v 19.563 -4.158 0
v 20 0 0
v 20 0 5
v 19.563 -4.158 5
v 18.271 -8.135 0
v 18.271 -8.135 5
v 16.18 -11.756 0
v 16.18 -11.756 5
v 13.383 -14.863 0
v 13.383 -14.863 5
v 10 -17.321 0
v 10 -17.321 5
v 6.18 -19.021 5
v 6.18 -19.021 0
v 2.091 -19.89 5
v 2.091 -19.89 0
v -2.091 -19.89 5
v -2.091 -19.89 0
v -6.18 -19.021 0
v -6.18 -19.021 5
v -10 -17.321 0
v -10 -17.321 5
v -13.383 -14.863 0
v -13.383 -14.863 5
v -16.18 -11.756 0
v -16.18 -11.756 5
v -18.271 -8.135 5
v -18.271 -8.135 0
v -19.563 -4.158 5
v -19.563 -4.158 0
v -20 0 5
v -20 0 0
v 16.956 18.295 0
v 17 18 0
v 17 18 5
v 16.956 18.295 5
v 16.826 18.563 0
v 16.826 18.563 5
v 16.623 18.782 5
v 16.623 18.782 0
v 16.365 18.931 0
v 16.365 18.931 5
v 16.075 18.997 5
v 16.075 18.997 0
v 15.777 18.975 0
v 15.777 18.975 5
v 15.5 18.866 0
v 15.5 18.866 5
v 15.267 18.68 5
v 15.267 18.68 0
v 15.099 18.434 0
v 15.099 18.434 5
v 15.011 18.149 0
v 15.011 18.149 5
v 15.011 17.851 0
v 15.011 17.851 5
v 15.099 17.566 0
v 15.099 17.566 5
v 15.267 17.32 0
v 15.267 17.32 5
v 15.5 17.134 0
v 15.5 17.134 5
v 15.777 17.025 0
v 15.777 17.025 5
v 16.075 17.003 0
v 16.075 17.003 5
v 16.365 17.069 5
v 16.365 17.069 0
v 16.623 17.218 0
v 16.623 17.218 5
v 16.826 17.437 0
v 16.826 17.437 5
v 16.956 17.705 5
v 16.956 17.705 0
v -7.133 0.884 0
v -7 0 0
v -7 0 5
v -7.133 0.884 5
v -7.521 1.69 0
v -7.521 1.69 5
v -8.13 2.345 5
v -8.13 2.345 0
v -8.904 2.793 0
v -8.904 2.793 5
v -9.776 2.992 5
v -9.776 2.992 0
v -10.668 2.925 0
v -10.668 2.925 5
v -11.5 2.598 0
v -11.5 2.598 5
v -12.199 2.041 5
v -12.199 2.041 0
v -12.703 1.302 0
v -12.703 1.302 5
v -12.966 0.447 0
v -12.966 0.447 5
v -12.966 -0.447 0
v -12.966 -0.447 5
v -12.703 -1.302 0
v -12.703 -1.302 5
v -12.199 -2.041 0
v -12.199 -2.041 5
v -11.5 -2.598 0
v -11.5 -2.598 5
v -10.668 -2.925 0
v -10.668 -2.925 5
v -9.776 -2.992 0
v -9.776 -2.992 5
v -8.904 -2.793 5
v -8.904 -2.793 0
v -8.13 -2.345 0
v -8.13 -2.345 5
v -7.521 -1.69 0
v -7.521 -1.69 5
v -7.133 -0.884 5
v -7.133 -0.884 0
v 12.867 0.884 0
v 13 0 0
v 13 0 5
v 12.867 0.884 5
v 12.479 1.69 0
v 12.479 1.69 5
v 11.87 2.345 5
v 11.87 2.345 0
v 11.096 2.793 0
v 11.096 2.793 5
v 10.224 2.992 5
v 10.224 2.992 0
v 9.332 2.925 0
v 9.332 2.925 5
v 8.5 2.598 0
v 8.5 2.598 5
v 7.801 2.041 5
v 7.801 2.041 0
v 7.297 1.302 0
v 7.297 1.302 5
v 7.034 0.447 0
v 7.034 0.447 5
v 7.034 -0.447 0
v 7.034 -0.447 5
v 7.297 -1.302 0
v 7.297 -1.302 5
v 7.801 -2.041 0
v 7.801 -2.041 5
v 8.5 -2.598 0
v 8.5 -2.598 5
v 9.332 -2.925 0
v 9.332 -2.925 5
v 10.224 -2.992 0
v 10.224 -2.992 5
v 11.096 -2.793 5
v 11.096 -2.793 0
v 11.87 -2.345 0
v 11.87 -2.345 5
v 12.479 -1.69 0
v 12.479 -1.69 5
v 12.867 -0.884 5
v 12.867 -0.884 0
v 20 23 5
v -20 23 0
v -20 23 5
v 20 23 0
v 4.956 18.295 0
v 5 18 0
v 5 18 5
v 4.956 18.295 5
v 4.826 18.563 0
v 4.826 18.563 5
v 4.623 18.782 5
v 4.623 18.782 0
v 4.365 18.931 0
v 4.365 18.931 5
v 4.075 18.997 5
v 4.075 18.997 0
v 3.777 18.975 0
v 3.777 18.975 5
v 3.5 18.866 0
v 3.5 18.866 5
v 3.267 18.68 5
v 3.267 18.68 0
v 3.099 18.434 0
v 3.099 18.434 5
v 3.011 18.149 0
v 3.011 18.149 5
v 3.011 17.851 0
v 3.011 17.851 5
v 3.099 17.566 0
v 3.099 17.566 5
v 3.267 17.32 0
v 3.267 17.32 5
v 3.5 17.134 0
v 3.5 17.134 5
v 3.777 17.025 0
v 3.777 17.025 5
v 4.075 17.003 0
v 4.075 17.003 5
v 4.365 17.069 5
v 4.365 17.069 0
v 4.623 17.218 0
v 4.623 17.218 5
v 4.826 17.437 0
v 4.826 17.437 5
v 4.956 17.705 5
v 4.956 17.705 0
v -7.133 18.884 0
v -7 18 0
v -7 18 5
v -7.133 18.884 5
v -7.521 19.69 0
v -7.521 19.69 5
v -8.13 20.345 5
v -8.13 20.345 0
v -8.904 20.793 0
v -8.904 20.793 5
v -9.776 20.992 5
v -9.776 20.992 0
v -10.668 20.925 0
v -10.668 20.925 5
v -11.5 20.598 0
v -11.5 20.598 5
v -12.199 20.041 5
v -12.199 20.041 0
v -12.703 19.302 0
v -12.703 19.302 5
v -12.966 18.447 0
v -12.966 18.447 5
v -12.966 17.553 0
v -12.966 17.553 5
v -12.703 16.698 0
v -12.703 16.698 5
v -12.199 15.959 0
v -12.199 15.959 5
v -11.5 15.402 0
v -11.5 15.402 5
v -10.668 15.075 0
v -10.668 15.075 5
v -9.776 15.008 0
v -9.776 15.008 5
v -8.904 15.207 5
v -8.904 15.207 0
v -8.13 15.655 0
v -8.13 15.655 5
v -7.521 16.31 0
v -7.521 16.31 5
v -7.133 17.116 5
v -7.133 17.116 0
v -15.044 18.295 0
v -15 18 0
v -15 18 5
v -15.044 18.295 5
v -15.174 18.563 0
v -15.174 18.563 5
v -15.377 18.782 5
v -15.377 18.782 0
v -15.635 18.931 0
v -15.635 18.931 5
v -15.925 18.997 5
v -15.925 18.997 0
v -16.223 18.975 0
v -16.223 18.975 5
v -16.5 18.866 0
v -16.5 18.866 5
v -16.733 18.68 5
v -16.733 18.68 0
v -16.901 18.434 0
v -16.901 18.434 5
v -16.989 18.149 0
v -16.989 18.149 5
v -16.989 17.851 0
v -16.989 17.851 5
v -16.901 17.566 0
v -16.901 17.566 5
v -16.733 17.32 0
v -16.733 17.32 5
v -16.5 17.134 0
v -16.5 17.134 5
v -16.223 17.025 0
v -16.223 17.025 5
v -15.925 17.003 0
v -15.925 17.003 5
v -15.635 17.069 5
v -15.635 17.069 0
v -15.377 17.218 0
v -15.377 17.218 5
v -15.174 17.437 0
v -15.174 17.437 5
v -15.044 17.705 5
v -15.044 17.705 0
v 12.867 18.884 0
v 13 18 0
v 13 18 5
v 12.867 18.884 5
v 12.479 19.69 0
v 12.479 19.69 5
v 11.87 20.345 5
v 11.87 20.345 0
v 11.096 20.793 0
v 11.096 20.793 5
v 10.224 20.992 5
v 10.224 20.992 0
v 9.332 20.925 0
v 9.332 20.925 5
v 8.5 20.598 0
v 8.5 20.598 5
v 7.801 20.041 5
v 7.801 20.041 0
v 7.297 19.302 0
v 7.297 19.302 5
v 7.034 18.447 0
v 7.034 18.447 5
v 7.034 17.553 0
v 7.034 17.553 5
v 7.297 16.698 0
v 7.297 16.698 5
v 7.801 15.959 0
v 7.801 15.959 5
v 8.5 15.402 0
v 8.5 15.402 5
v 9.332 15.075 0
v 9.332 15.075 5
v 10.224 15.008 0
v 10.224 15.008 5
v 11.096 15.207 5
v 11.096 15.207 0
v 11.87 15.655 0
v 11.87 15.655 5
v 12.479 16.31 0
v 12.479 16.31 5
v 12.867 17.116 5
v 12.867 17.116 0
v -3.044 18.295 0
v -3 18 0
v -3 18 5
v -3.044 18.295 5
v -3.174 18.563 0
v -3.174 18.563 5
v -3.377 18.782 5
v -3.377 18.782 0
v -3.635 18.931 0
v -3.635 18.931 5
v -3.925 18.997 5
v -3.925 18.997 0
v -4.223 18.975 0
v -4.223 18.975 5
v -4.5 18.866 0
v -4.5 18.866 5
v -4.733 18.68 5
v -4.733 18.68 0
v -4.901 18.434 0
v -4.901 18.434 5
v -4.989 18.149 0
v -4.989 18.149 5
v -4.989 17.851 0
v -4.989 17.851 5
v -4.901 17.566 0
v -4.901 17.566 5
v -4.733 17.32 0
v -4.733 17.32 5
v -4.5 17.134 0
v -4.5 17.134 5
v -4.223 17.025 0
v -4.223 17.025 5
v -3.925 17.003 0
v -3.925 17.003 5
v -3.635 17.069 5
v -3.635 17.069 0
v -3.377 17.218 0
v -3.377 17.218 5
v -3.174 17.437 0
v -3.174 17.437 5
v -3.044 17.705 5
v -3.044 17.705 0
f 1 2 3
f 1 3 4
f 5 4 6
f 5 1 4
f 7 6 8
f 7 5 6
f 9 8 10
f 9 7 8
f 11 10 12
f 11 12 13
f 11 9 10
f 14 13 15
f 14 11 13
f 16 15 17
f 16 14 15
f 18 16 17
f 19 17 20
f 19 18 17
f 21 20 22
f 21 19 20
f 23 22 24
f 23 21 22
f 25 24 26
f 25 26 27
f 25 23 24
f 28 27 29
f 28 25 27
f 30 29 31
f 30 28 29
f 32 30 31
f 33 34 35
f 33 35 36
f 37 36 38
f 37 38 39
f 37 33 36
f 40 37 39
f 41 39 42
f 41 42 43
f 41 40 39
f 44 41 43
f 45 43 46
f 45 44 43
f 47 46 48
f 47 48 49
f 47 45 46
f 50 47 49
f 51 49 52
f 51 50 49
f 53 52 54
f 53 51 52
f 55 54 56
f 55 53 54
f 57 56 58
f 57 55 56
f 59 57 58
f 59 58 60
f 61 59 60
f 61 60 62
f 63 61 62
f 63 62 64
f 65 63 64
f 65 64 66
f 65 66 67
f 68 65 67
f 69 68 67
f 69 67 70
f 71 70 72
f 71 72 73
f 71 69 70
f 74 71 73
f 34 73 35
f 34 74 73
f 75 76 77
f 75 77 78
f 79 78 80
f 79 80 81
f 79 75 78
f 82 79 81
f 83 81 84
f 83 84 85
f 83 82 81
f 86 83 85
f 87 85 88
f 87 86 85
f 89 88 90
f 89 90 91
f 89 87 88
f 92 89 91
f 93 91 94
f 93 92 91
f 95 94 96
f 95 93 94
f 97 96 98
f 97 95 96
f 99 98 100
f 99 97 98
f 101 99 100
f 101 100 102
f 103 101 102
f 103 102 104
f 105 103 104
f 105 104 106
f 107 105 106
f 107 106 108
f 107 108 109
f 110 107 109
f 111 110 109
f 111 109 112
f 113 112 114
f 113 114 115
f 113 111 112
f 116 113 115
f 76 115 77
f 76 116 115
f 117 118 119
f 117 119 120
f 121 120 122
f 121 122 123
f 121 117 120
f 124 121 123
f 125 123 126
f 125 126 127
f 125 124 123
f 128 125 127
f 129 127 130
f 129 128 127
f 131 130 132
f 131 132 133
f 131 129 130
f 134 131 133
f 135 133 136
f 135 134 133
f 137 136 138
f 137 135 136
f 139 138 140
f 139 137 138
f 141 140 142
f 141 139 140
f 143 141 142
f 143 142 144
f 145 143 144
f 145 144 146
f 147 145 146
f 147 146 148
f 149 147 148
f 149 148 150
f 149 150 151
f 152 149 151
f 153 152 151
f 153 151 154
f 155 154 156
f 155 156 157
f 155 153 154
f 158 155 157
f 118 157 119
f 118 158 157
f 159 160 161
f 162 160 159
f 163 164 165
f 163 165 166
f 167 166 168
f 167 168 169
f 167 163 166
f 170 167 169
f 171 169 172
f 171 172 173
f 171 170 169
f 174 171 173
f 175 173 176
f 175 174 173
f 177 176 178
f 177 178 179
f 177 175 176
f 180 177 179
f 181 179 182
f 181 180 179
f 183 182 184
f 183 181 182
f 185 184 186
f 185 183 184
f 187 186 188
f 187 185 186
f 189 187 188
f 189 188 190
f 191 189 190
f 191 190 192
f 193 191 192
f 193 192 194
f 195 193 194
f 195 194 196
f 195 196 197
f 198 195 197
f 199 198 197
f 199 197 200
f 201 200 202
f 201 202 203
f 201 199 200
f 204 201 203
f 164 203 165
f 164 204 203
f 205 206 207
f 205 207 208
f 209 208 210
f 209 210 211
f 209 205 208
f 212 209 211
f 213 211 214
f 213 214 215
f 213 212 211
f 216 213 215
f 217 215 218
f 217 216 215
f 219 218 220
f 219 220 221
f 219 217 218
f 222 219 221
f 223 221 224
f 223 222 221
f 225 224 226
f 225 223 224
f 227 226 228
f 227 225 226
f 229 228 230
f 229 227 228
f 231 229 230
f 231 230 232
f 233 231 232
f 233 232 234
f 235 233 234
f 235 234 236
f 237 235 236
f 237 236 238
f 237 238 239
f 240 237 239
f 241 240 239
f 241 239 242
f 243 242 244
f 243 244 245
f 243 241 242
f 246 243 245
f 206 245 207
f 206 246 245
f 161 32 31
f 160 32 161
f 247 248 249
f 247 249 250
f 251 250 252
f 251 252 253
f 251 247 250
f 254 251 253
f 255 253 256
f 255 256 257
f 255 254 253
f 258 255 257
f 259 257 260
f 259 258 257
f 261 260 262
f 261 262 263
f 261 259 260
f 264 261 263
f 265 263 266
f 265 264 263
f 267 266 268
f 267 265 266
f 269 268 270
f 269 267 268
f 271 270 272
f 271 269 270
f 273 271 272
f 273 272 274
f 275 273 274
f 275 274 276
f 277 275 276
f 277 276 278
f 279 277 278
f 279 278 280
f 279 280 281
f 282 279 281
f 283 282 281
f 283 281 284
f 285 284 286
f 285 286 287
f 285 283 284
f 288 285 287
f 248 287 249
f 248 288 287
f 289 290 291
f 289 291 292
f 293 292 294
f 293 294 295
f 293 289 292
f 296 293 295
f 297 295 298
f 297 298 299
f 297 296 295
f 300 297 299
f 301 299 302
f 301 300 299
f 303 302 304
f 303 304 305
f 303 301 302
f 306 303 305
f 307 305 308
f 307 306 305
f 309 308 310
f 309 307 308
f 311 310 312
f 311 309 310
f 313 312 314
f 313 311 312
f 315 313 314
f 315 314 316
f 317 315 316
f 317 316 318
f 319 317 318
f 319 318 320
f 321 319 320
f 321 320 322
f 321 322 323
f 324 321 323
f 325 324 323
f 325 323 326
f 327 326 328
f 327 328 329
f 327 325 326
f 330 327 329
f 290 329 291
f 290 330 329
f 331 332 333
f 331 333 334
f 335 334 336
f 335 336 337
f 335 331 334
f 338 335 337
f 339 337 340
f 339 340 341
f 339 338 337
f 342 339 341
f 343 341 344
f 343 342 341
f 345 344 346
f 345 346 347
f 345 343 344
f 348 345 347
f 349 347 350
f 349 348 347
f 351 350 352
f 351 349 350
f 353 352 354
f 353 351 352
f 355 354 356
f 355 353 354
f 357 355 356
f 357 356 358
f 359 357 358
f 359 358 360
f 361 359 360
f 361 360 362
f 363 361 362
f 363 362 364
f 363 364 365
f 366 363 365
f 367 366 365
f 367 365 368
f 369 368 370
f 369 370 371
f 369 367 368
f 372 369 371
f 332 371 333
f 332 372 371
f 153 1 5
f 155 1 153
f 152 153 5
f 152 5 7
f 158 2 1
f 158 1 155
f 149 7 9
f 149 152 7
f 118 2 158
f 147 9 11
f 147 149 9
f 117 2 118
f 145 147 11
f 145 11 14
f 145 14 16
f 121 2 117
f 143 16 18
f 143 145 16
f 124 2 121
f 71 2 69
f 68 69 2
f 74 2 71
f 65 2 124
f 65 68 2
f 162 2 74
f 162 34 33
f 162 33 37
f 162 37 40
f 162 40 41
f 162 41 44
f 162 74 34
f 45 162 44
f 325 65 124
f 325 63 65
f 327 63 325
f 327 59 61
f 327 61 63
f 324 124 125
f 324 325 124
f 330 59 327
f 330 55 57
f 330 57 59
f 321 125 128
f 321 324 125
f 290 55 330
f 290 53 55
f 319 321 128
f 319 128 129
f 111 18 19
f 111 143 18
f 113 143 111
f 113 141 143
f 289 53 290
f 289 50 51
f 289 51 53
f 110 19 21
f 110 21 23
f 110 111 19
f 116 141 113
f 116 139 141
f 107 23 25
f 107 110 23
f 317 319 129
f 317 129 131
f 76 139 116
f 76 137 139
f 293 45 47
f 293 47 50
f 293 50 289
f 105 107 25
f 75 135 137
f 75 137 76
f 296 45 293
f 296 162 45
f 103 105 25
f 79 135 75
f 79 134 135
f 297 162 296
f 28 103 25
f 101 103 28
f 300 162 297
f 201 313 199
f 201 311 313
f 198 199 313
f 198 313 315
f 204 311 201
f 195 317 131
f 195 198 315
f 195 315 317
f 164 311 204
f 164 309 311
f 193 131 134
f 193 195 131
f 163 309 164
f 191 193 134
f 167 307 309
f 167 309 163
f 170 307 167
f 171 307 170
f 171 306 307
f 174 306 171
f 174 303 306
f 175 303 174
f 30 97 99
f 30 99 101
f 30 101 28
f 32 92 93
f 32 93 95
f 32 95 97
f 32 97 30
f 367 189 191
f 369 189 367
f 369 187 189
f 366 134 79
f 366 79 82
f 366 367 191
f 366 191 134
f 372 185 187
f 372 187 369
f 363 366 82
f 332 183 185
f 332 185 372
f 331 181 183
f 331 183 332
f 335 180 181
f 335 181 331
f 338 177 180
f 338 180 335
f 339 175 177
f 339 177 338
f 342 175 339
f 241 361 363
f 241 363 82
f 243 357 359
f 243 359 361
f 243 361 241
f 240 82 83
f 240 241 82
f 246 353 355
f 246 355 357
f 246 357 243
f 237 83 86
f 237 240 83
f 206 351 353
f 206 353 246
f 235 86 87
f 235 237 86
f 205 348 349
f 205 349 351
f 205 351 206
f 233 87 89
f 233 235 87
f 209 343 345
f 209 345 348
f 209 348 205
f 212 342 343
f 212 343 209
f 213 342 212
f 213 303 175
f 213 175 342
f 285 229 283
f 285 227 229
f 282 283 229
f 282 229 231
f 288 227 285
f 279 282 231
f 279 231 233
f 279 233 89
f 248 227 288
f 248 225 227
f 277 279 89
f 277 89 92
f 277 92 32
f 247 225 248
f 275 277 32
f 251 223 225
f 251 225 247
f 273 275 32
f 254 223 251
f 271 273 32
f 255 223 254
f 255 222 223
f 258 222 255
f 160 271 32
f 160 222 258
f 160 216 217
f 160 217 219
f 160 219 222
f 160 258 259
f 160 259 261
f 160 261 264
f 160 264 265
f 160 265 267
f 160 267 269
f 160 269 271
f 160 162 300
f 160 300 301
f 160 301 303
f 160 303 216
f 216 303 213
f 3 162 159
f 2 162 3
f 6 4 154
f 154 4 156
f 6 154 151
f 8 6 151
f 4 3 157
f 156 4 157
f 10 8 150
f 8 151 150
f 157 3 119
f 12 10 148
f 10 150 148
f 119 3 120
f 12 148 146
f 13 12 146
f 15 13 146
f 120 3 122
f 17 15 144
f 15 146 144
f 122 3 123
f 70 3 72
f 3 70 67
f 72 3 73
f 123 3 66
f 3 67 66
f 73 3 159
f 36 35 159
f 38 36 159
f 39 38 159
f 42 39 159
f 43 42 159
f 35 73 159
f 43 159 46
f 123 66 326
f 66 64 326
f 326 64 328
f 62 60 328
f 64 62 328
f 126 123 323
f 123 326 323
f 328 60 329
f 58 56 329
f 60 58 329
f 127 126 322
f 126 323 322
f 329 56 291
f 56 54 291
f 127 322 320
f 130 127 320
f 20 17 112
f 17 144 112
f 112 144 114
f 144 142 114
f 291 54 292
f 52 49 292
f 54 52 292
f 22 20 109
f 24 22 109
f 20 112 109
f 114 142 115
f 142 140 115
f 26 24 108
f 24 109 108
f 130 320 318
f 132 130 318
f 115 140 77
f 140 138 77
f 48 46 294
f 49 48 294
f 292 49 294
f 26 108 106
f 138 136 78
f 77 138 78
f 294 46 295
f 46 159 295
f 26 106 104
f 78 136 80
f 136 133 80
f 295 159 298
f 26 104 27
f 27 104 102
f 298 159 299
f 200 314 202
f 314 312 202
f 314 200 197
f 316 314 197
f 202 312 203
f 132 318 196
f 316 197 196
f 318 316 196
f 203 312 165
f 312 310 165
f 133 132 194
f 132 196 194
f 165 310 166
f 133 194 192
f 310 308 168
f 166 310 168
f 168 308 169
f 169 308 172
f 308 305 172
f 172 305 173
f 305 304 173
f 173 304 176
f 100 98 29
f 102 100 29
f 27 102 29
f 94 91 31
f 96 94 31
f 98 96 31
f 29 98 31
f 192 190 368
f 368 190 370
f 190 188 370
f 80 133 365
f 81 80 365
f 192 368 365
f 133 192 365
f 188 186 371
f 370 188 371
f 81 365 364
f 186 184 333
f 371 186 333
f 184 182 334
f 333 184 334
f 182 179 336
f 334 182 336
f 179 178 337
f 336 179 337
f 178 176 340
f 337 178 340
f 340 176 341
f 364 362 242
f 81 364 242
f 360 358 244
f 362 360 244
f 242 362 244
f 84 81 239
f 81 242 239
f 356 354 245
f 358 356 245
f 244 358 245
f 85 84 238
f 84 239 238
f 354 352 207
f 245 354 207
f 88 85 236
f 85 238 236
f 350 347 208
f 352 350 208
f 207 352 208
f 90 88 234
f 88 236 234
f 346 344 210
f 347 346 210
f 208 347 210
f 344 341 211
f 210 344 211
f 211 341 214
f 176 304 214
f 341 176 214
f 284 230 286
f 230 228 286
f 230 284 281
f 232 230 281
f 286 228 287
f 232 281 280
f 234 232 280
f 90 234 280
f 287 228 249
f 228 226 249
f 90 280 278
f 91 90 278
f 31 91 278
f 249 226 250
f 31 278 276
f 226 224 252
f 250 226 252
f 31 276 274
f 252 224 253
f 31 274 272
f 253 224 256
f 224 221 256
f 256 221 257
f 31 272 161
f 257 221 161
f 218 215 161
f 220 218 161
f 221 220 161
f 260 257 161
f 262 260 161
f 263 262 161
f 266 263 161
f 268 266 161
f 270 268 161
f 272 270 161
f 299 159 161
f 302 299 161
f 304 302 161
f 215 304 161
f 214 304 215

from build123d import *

# Parameters (mm, degrees)
CROQUIS1_R              = 3
CROQUIS1_R_2            = 1
SALIENTE_EXTRUIR1_DEPTH = 5


with BuildPart() as part:
    # Croquis1 → Saliente-Extruir1 (new body)
    with BuildSketch(Plane.XY):
        with BuildLine():
            Line((-20, 0), (-20, 23))
            Line((-20, 23), (20, 23))
            Line((20, 23), (20, 0))
            ThreePointArc((20, 0), (0, -20), (-20, 0))
        make_face()
        with Locations((10, 0)):
            Circle(CROQUIS1_R, mode=Mode.SUBTRACT)
        with Locations((-10, 0)):
            Circle(CROQUIS1_R, mode=Mode.SUBTRACT)
        with Locations((-10, 18)):
            Circle(CROQUIS1_R, mode=Mode.SUBTRACT)
        with Locations((10, 18)):
            Circle(CROQUIS1_R, mode=Mode.SUBTRACT)
        with Locations((-4, 18)):
            Circle(CROQUIS1_R_2, mode=Mode.SUBTRACT)
        with Locations((-16, 18)):
            Circle(CROQUIS1_R_2, mode=Mode.SUBTRACT)
        with Locations((4, 18)):
            Circle(CROQUIS1_R_2, mode=Mode.SUBTRACT)
        with Locations((16, 18)):
            Circle(CROQUIS1_R_2, mode=Mode.SUBTRACT)
    extrude(amount=SALIENTE_EXTRUIR1_DEPTH)


solid = part.part
